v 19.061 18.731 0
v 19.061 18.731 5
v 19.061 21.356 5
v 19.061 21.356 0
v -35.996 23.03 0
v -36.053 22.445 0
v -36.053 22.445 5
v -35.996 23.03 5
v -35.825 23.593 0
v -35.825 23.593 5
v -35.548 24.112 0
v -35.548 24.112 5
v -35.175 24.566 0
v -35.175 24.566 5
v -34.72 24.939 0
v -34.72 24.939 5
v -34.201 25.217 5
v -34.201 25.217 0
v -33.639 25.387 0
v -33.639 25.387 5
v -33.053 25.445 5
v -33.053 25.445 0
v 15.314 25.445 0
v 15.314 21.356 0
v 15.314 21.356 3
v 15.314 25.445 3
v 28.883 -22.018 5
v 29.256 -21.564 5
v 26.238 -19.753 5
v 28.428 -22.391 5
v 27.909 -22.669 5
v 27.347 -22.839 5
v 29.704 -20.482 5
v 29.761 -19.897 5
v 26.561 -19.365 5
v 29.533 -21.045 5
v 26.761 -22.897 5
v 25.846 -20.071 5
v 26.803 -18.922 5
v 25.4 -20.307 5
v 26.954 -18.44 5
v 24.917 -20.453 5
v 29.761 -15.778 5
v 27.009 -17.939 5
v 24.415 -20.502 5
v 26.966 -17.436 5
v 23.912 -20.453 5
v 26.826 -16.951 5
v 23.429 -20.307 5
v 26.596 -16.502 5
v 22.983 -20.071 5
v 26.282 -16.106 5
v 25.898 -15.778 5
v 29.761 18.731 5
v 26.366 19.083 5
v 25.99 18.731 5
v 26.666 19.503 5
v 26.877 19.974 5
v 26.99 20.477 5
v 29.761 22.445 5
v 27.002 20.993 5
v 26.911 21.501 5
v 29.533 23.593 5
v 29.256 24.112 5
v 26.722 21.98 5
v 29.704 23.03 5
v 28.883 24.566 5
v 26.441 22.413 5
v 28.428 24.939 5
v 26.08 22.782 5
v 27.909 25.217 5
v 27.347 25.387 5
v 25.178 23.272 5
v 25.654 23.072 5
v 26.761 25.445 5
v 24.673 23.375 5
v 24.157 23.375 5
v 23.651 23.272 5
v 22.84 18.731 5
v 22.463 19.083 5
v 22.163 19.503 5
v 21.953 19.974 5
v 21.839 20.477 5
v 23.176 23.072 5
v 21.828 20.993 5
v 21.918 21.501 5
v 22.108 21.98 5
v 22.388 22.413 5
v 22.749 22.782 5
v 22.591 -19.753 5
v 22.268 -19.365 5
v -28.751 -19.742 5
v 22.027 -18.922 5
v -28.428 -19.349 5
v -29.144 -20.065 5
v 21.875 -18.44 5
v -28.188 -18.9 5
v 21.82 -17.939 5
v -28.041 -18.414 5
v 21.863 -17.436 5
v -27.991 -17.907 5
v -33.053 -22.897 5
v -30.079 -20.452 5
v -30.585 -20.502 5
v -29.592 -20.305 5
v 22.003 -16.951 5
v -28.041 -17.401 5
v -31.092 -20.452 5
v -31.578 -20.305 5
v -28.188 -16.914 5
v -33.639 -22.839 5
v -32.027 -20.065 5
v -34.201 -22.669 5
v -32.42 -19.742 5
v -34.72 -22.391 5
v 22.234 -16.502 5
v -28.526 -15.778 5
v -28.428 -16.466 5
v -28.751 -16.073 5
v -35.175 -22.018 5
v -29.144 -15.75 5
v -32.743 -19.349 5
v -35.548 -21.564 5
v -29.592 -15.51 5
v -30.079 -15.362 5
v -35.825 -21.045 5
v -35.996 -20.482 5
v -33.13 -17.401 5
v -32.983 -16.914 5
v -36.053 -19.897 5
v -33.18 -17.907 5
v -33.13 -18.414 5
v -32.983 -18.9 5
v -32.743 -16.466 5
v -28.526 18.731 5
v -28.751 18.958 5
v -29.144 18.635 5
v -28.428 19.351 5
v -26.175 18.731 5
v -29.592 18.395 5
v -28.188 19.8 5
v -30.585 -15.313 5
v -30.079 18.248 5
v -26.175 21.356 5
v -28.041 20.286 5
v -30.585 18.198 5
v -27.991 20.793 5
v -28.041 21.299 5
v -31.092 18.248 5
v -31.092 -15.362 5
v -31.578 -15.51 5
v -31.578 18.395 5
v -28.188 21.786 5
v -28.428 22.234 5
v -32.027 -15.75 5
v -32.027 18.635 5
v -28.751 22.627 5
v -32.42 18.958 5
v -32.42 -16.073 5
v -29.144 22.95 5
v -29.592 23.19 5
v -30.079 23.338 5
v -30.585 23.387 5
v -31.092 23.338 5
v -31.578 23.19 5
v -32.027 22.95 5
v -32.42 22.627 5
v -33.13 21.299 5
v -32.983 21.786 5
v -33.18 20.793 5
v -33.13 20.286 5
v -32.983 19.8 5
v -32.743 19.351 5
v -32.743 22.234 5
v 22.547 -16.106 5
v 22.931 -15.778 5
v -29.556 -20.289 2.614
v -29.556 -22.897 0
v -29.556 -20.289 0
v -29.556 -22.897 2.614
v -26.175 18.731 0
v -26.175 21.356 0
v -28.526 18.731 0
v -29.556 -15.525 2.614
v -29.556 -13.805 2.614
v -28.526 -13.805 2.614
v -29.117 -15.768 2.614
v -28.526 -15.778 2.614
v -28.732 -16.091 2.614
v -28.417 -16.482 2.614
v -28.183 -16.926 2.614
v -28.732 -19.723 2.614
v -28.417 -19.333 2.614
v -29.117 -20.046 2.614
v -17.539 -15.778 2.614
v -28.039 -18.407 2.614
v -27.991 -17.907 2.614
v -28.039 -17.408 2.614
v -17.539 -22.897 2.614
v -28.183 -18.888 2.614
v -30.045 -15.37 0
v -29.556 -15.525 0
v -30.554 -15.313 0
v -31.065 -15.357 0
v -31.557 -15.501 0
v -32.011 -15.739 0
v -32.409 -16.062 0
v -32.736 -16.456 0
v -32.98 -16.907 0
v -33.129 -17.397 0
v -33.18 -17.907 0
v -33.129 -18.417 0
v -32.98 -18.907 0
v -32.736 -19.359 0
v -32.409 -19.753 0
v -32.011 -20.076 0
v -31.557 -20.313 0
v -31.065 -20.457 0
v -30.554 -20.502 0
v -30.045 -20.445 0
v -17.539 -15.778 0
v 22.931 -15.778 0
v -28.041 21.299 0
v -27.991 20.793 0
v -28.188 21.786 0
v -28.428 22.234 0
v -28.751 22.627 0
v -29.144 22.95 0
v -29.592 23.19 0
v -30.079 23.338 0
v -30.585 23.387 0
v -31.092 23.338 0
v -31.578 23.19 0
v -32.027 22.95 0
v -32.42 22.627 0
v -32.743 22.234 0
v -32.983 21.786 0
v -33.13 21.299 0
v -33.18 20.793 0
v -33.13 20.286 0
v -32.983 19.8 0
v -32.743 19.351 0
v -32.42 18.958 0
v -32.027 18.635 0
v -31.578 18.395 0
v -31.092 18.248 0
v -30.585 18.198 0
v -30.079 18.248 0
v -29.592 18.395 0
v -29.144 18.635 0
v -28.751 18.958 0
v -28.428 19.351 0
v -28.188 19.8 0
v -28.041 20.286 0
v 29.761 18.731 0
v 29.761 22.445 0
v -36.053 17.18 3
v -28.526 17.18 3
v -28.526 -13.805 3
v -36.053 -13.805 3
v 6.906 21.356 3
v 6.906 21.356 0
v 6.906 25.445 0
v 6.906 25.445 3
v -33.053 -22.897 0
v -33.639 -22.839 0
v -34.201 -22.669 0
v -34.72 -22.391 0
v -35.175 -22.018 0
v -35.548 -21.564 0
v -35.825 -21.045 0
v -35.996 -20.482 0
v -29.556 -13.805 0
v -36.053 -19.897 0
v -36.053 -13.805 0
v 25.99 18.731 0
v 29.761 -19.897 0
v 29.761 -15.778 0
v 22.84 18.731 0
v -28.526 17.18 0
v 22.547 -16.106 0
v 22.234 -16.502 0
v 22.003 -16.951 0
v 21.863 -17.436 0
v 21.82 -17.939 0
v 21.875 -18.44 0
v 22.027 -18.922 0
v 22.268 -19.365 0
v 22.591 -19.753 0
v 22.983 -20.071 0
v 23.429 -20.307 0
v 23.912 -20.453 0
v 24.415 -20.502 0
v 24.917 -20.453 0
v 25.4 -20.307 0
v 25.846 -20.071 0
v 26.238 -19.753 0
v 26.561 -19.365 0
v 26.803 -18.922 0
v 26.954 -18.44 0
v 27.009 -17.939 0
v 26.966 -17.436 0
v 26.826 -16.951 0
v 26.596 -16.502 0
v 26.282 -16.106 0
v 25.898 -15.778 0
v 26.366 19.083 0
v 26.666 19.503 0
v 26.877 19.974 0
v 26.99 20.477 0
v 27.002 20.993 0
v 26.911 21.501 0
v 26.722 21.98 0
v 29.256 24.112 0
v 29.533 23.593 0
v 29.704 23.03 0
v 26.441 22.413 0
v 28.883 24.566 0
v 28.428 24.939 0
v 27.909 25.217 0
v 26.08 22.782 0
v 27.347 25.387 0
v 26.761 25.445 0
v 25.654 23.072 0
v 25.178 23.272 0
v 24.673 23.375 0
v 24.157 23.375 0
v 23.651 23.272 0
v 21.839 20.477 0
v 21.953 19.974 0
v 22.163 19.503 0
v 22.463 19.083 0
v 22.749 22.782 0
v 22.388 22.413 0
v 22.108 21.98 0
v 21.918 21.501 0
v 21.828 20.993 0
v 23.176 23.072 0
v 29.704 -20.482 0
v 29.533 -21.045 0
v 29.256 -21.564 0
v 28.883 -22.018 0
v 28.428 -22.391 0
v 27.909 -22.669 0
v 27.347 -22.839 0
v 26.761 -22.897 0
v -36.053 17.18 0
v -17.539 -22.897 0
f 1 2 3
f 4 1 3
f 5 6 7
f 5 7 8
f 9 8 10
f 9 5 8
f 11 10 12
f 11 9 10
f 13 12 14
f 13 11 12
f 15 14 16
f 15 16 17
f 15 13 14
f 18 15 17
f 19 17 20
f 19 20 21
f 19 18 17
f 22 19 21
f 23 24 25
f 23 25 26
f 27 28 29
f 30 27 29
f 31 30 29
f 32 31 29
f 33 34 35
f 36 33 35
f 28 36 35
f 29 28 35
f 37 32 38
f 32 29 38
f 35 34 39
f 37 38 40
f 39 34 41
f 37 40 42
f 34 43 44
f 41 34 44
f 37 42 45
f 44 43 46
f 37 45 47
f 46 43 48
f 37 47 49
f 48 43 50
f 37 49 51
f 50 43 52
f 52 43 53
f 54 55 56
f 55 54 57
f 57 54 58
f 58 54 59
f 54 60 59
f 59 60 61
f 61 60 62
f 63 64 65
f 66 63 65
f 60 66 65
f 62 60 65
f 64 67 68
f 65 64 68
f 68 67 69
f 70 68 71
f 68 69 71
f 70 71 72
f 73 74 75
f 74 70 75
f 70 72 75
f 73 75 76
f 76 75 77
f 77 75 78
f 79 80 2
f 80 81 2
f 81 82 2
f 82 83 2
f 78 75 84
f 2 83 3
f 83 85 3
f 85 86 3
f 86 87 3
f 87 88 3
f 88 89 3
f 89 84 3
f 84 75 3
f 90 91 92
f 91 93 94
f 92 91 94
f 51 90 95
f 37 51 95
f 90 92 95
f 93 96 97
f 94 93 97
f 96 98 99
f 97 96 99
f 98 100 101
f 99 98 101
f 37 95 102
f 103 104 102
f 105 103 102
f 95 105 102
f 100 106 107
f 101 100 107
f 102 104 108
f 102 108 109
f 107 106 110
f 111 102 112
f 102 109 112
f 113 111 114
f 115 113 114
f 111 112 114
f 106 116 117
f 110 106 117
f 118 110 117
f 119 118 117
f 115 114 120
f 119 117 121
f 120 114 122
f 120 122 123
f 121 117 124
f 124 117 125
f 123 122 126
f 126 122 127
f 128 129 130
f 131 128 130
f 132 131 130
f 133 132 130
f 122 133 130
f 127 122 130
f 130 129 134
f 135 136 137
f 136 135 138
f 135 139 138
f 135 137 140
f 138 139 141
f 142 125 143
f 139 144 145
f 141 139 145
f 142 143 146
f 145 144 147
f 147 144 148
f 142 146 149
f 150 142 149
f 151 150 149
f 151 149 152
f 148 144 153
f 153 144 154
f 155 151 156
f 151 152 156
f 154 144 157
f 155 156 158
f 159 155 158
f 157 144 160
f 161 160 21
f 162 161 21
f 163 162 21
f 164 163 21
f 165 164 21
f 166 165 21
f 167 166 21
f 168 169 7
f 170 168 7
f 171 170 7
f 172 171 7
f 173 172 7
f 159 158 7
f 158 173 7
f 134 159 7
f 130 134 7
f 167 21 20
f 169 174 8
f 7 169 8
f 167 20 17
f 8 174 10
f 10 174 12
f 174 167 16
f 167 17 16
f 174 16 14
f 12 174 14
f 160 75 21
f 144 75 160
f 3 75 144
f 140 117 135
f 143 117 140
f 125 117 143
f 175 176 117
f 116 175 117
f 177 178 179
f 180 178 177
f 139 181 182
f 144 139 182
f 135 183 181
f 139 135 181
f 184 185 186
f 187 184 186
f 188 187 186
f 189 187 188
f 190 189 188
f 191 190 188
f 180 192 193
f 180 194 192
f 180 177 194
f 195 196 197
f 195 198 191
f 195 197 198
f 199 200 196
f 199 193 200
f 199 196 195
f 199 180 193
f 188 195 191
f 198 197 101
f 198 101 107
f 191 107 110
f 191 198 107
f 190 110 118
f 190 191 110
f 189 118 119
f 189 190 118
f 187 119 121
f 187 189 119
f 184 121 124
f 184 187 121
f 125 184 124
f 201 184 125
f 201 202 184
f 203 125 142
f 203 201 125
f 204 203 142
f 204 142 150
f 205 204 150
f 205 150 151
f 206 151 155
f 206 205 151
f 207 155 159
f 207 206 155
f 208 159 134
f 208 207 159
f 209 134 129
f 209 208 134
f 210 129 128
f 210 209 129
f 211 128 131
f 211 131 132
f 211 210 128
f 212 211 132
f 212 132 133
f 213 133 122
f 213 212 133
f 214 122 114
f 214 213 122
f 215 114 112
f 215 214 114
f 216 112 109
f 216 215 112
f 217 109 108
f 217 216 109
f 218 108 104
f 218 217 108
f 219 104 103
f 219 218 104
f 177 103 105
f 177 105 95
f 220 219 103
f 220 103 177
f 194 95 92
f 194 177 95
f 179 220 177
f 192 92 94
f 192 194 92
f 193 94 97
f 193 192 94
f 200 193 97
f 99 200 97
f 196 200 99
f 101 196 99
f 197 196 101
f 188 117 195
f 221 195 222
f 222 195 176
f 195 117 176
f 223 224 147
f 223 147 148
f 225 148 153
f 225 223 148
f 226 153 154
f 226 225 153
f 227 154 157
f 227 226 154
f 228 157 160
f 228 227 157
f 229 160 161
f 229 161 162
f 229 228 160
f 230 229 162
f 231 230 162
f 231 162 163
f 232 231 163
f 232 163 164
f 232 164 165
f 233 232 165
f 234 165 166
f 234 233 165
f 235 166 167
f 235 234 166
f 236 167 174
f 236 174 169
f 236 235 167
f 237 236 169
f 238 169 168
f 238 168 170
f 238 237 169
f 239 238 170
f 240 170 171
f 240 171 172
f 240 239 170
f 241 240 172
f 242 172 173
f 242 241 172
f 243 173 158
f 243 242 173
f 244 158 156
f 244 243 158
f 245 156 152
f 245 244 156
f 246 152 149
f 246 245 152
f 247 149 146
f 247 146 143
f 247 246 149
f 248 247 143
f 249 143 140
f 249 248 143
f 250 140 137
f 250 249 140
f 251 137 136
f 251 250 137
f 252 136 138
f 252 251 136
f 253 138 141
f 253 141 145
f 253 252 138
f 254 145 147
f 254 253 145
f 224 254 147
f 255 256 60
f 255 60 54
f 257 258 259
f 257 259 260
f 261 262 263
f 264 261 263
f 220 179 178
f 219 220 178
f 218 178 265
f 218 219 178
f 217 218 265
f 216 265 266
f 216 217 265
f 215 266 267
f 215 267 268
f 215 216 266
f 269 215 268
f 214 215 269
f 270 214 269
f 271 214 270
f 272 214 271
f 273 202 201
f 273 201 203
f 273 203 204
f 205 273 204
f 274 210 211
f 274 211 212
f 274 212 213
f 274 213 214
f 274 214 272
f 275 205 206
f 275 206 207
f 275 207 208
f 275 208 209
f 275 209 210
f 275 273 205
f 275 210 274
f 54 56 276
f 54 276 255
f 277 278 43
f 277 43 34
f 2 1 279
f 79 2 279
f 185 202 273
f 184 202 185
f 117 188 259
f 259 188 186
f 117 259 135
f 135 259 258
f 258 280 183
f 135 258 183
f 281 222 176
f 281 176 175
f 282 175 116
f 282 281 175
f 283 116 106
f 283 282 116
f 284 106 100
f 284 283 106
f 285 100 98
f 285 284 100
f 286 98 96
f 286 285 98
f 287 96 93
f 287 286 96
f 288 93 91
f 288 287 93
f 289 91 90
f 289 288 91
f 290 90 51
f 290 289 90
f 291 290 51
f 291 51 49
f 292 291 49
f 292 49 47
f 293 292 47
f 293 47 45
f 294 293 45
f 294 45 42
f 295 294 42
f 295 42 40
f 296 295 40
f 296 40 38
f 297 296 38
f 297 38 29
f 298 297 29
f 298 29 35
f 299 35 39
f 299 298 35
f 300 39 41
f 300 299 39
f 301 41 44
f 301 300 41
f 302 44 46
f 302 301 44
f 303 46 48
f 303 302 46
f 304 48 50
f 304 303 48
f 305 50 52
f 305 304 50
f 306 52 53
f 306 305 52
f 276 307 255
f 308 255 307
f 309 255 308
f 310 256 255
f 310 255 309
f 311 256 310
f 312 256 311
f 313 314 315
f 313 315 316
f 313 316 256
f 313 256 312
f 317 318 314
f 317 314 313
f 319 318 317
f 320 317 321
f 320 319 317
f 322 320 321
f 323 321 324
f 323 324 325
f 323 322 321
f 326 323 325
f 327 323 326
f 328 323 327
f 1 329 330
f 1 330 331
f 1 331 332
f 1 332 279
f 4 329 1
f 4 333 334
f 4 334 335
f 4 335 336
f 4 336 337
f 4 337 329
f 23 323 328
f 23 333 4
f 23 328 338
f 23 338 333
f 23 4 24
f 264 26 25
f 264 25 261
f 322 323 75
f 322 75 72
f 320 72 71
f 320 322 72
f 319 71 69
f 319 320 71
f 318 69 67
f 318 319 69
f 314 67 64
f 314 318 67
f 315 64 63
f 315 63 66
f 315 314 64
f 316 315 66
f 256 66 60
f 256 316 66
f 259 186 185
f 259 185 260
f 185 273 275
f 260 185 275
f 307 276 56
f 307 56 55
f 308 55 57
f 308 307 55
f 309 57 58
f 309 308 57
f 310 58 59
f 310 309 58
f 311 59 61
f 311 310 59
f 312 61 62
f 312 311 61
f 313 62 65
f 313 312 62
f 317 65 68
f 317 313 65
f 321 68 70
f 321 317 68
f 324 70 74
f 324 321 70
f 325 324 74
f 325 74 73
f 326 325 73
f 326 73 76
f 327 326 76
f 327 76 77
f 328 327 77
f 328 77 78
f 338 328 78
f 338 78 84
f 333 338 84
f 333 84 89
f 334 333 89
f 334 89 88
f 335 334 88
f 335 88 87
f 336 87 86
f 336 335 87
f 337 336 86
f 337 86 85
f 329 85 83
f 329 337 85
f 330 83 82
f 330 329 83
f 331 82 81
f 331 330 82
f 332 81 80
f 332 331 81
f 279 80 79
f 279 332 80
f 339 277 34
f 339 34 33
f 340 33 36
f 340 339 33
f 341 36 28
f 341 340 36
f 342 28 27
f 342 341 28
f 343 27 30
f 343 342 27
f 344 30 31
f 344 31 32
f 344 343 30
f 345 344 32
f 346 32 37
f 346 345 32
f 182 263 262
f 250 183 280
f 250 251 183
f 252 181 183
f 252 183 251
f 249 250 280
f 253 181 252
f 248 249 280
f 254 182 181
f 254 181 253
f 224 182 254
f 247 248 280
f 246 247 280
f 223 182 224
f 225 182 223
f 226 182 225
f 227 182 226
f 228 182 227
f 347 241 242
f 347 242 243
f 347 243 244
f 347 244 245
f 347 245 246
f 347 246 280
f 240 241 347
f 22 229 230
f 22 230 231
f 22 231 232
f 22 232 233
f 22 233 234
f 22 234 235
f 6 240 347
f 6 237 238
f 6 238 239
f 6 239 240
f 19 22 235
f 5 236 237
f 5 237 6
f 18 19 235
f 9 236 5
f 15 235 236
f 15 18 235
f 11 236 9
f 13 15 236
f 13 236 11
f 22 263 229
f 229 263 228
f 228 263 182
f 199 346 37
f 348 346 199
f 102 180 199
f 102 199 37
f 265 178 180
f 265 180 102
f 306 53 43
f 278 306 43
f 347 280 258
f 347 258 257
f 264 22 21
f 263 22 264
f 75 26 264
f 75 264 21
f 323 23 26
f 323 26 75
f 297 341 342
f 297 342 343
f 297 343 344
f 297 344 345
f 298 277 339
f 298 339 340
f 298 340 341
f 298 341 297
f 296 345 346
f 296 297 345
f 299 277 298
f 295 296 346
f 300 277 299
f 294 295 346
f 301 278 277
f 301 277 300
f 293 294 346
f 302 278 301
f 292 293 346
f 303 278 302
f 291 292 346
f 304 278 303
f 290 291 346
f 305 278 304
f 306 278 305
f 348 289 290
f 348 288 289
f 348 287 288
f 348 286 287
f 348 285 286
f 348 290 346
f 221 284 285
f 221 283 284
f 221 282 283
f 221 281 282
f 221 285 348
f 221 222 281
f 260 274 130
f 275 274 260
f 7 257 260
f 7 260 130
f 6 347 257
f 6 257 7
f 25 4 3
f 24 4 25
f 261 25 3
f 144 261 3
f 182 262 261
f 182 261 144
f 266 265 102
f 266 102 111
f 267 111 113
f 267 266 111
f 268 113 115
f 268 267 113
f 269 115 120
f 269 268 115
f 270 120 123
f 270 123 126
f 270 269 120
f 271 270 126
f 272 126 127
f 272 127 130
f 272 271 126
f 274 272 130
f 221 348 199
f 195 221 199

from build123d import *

# Parameters (mm, degrees)
SKETCH_1_R          = 2.594697184
SKETCH_1_W          = 50.755093491
SKETCH_1_H          = 34.509114599
EXTRUDE_1_DEPTH     = 5
SKETCH_2_W          = 12.017165499
SKETCH_2_H          = 2.614231611
CUT_EXTRUDE_1_DEPTH = 10
SKETCH_3_W          = 7.527857493
SKETCH_3_H          = 30.984988894
CUT_EXTRUDE_2_DEPTH = 3
SKETCH_4_W          = 11.818287361
SKETCH_4_H          = 34.509114599
CUT_EXTRUDE_3_DEPTH = 10
SKETCH_5_W          = 8.407446584
SKETCH_5_H          = 13.753485989
CUT_EXTRUDE_4_DEPTH = 3
SKETCH_6_W          = 45.235718037
SKETCH_6_H          = 4.020952714
CUT_EXTRUDE_5_DEPTH = 10


with BuildPart() as part:
    # 草图1 → 凸台-拉伸1 (new body)
    with BuildSketch(Plane.XY):
        with BuildLine():
            Line((-33.053422138, 25.444897132), (26.761429335, 25.444897132))
            ThreePointArc((26.761429335, 25.444897132), (28.882749679, 24.566217475), (29.761429335, 22.444897132))
            Line((29.761429335, 22.444897132), (29.761429335, -19.896984924))
            ThreePointArc((29.761429335, -19.896984924), (28.882749679, -22.018305267), (26.761429335, -22.896984924))
            Line((26.761429335, -22.896984924), (-33.053422138, -22.896984924))
            ThreePointArc((-33.053422138, -22.896984924), (-35.174742482, -22.018305267), (-36.053422138, -19.896984924))
            Line((-36.053422138, -19.896984924), (-36.053422138, 22.444897132))
            ThreePointArc((-36.053422138, 22.444897132), (-35.174742482, 24.566217475), (-33.053422138, 25.444897132))
        make_face()
        with Locations((-30.585365854, 20.792682927)):
            Circle(SKETCH_1_R, mode=Mode.SUBTRACT)
        with Locations((24.414634146, 20.792682927)):
            Circle(SKETCH_1_R, mode=Mode.SUBTRACT)
        with Locations((-30.585365854, -17.907317073)):
            Circle(SKETCH_1_R, mode=Mode.SUBTRACT)
        with Locations((24.414634146, -17.907317073)):
            Circle(SKETCH_1_R, mode=Mode.SUBTRACT)
        with Locations((-3.1480179, 1.476070041)):
            Rectangle(SKETCH_1_W, SKETCH_1_H, mode=Mode.SUBTRACT)
    extrude(amount=EXTRUDE_1_DEPTH)

    # 草图2 → 切除-拉伸1 (cut)
    with BuildSketch(Plane.XZ.offset(22.896984924)):
        with Locations((-23.547762162, 1.307115806)):
            Rectangle(SKETCH_2_W, SKETCH_2_H)
    extrude(amount=-CUT_EXTRUDE_1_DEPTH, mode=Mode.SUBTRACT)

    # 草图3 → 切除-拉伸2 (cut)
    with BuildSketch(Plane(origin=(0, 0, 0), x_dir=(-1, 0, 0), z_dir=(0, 0, -1))):
        with Locations((32.289493392, 1.687877711)):
            Rectangle(SKETCH_3_W, SKETCH_3_H)
    extrude(amount=-CUT_EXTRUDE_2_DEPTH, mode=Mode.SUBTRACT)

    # 草图4 → 切除-拉伸3 (cut)
    with BuildSketch(Plane.XY.offset(5)):
        with Locations((28.138672527, 1.476070041)):
            Rectangle(SKETCH_4_W, SKETCH_4_H)
    extrude(amount=-CUT_EXTRUDE_3_DEPTH, mode=Mode.SUBTRACT)

    # 草图5 → 切除-拉伸4 (cut)
    with BuildSketch(Plane(origin=(0, 0, 0), x_dir=(-1, 0, 0), z_dir=(0, 0, -1))):
        with Locations((-11.110108677, 20.556252076)):
            Rectangle(SKETCH_5_W, SKETCH_5_H)
    extrude(amount=-CUT_EXTRUDE_4_DEPTH, mode=Mode.SUBTRACT)

    # 草图6 → 切除-拉伸5 (cut)
    with BuildSketch(Plane(origin=(0, 0, 0), x_dir=(-1, 0, 0), z_dir=(0, 0, -1))):
        with Locations((3.557230201, 19.345396997)):
            Rectangle(SKETCH_6_W, SKETCH_6_H)
    extrude(amount=-CUT_EXTRUDE_5_DEPTH, mode=Mode.SUBTRACT)


solid = part.part
